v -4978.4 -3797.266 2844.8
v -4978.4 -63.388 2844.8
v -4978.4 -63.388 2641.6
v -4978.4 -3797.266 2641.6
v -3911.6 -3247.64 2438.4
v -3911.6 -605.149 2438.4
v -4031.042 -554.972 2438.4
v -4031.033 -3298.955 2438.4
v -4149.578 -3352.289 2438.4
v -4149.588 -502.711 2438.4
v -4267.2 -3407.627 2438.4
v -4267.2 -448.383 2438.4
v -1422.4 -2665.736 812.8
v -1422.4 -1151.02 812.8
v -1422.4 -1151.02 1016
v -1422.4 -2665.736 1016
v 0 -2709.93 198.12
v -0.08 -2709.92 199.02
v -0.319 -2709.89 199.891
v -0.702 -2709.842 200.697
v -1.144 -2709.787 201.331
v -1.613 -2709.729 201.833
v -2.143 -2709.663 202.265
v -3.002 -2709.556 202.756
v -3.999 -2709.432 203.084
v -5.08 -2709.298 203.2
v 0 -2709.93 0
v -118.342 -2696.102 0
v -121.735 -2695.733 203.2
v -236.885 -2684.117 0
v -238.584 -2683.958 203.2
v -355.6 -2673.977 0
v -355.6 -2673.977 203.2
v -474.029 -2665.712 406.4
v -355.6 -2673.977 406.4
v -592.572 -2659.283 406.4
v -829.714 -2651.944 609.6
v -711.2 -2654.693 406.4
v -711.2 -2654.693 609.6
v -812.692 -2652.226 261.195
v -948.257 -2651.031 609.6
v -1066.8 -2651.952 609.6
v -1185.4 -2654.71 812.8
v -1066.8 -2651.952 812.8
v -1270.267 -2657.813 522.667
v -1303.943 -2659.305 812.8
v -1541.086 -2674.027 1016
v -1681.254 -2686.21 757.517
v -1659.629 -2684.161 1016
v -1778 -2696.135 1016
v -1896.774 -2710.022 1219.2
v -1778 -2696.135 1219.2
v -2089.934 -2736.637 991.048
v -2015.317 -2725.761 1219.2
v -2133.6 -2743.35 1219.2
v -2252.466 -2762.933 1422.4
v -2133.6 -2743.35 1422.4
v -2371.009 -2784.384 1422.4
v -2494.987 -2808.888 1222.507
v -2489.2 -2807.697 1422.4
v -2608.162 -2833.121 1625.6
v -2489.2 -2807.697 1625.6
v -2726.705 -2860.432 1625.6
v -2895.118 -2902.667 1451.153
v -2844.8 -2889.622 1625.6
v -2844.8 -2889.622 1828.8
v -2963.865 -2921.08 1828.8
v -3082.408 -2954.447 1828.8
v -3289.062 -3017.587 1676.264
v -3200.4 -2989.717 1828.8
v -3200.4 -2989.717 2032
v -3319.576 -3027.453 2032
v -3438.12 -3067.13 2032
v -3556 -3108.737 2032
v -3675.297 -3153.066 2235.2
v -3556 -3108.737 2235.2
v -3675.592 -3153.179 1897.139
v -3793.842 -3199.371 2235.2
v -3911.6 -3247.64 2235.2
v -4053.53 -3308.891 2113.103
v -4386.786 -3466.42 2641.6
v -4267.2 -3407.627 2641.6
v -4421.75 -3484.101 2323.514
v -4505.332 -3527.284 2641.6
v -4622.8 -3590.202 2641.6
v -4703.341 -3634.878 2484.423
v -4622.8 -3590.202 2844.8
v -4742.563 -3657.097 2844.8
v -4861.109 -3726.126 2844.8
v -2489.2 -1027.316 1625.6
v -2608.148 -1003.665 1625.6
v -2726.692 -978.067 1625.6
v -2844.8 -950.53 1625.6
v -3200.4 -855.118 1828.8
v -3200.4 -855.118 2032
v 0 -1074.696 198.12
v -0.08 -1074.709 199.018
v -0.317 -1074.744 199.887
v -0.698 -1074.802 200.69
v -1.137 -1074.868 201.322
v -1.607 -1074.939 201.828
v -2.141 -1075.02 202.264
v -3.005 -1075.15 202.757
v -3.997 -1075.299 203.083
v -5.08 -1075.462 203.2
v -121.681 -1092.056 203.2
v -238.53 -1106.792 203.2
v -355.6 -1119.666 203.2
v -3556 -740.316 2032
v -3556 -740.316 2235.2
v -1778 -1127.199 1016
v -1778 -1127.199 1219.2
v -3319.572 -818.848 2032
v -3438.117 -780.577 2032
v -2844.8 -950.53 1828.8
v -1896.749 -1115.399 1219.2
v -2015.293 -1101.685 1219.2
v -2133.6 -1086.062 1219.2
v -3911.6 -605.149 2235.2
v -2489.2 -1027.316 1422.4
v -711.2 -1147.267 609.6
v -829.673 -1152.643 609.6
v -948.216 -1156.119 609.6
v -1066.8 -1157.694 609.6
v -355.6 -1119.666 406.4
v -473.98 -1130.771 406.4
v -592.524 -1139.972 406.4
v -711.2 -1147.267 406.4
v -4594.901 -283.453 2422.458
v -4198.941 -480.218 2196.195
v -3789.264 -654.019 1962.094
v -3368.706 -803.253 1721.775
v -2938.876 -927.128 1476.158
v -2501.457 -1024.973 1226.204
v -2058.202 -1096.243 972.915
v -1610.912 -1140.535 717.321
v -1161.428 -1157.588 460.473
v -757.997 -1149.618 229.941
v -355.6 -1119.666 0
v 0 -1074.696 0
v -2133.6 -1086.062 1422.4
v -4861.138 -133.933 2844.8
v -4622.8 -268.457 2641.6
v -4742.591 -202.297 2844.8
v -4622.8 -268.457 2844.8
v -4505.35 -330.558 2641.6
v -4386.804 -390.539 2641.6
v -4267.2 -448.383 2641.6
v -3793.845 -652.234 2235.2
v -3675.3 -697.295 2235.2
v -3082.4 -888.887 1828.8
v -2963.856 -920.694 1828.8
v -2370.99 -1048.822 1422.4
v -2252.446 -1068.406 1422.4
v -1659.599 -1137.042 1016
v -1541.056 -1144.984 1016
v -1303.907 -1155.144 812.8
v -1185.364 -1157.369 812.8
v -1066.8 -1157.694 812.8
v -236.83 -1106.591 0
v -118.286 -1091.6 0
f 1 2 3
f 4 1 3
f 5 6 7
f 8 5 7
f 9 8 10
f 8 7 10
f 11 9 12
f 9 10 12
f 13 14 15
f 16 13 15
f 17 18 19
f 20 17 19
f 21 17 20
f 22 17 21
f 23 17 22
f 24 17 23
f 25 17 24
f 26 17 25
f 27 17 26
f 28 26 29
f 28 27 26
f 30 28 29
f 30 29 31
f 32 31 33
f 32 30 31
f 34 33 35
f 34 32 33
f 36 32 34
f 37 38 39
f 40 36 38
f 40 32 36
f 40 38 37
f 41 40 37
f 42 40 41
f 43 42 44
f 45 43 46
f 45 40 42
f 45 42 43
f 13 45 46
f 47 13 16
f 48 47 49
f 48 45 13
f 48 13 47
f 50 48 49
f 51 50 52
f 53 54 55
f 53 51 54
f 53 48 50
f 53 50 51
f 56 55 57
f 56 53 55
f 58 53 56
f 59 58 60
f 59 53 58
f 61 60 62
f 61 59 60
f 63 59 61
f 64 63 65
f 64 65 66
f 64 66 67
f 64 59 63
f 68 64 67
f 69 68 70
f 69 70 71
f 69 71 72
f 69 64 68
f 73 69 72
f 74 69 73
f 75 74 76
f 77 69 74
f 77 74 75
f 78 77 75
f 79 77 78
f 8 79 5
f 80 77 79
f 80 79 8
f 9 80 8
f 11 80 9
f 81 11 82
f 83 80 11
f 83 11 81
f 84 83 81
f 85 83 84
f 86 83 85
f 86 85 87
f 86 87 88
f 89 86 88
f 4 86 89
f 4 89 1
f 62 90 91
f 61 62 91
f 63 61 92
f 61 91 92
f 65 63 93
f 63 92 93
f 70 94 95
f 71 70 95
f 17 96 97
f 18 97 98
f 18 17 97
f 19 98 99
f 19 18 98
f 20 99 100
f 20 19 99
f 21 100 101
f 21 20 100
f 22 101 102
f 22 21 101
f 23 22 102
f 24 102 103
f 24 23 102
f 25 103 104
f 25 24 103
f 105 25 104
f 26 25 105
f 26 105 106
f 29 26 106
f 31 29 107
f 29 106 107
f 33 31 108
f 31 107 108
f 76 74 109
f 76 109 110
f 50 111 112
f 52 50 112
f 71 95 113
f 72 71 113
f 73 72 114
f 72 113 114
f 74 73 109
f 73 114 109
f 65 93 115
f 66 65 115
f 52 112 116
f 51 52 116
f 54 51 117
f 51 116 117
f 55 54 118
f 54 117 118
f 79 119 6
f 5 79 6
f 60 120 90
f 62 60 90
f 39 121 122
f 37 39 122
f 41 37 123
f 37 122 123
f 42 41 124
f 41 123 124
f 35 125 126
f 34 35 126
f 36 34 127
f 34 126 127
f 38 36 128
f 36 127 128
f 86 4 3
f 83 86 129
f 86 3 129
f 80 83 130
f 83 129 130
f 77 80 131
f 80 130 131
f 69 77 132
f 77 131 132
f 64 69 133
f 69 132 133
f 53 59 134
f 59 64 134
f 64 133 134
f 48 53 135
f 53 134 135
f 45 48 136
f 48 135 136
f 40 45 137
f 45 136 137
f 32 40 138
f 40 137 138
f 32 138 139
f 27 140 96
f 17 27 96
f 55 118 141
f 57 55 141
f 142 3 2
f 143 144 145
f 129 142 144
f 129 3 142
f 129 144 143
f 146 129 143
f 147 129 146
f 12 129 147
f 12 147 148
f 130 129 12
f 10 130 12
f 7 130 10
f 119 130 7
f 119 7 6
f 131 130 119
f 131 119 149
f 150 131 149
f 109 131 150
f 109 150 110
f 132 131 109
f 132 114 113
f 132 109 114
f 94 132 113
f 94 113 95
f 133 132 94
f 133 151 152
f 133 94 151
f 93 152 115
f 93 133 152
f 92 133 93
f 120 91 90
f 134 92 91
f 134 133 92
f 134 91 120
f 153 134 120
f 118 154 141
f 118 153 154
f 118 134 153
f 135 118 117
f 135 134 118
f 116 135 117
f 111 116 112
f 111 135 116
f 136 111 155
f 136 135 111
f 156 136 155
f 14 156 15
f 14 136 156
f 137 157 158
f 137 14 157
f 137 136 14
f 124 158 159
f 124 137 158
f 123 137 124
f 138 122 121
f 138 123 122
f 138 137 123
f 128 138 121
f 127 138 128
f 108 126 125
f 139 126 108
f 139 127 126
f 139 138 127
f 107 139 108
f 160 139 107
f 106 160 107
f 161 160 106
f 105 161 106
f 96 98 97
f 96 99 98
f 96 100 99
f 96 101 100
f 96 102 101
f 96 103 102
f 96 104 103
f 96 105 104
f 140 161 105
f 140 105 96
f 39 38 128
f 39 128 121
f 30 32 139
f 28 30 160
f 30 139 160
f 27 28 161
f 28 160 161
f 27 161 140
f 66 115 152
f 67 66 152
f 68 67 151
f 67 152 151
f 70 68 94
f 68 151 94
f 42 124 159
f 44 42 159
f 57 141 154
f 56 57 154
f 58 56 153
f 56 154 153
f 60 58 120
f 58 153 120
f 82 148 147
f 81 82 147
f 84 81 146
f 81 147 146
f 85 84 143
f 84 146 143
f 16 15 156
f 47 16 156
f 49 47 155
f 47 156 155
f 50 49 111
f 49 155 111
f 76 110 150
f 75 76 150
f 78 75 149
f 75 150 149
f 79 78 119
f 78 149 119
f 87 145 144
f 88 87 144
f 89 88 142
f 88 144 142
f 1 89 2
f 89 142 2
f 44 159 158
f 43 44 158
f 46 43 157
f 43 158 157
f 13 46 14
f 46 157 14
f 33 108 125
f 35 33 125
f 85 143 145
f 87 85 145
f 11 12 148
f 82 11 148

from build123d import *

# Parameters (mm, degrees)
F1_DEPTH = 3810
F2_R     = 5.08
F4_DEPTH = 3683


with BuildPart() as f1:
    # F0 (on Front) → F1 (new body)
    with BuildSketch(Plane.XZ):
        Polygon((-355.6, 0), (0, 0), (0, 203.2), (-355.6, 203.2), (-355.6, 406.4), (-711.2, 406.4), (-711.2, 609.6), (-1066.8, 609.6), (-1066.8, 812.8), (-1422.4, 812.8), (-1422.4, 1016), (-1778, 1016), (-1778, 1219.2), (-2133.6, 1219.2), (-2133.6, 1422.4), (-2489.2, 1422.4), (-2489.2, 1625.6), (-2844.8, 1625.6), (-2844.8, 1828.8), (-3200.4, 1828.8), (-3200.4, 2032), (-3556, 2032), (-3556, 2235.2), (-3911.6, 2235.2), (-3911.6, 2438.4), (-4267.2, 2438.4), (-4267.2, 2641.6), (-4622.8, 2641.6), (-4622.8, 2844.8), (-4978.4, 2844.8), (-4978.4, 2641.6), align=None)
    extrude(amount=F1_DEPTH)

    # F2
    f2_edges = [f1.edges().sort_by_distance(p)[0] for p in [
        (0, -1905, 203.2),
    ]]
    fillet(f2_edges, radius=F2_R)

    # F3 (on Top) → F4 (cut)
    with BuildSketch(Plane.XY):
        with BuildLine():
            Line((0, -3861.087799), (0, -2709.929943))
            ThreePointArc((0, -2709.929943), (-2640.73729, -2840.428822), (-5079.749107, -3861.087799))
            Line((-5079.749107, -3861.087799), (0, -3861.087799))
        make_face()
        with BuildLine():
            ThreePointArc((-5079.749107, 0), (-2637.241483, -997.570803), (0, -1074.696422))
            Line((0, -1074.696422), (0, 100.936957))
            Line((0, 100.936957), (-5079.749107, 100.936957))
            Line((-5079.749107, 100.936957), (-5079.749107, 0))
        make_face()
    extrude(amount=F4_DEPTH, mode=Mode.SUBTRACT)


solid = f1.part
